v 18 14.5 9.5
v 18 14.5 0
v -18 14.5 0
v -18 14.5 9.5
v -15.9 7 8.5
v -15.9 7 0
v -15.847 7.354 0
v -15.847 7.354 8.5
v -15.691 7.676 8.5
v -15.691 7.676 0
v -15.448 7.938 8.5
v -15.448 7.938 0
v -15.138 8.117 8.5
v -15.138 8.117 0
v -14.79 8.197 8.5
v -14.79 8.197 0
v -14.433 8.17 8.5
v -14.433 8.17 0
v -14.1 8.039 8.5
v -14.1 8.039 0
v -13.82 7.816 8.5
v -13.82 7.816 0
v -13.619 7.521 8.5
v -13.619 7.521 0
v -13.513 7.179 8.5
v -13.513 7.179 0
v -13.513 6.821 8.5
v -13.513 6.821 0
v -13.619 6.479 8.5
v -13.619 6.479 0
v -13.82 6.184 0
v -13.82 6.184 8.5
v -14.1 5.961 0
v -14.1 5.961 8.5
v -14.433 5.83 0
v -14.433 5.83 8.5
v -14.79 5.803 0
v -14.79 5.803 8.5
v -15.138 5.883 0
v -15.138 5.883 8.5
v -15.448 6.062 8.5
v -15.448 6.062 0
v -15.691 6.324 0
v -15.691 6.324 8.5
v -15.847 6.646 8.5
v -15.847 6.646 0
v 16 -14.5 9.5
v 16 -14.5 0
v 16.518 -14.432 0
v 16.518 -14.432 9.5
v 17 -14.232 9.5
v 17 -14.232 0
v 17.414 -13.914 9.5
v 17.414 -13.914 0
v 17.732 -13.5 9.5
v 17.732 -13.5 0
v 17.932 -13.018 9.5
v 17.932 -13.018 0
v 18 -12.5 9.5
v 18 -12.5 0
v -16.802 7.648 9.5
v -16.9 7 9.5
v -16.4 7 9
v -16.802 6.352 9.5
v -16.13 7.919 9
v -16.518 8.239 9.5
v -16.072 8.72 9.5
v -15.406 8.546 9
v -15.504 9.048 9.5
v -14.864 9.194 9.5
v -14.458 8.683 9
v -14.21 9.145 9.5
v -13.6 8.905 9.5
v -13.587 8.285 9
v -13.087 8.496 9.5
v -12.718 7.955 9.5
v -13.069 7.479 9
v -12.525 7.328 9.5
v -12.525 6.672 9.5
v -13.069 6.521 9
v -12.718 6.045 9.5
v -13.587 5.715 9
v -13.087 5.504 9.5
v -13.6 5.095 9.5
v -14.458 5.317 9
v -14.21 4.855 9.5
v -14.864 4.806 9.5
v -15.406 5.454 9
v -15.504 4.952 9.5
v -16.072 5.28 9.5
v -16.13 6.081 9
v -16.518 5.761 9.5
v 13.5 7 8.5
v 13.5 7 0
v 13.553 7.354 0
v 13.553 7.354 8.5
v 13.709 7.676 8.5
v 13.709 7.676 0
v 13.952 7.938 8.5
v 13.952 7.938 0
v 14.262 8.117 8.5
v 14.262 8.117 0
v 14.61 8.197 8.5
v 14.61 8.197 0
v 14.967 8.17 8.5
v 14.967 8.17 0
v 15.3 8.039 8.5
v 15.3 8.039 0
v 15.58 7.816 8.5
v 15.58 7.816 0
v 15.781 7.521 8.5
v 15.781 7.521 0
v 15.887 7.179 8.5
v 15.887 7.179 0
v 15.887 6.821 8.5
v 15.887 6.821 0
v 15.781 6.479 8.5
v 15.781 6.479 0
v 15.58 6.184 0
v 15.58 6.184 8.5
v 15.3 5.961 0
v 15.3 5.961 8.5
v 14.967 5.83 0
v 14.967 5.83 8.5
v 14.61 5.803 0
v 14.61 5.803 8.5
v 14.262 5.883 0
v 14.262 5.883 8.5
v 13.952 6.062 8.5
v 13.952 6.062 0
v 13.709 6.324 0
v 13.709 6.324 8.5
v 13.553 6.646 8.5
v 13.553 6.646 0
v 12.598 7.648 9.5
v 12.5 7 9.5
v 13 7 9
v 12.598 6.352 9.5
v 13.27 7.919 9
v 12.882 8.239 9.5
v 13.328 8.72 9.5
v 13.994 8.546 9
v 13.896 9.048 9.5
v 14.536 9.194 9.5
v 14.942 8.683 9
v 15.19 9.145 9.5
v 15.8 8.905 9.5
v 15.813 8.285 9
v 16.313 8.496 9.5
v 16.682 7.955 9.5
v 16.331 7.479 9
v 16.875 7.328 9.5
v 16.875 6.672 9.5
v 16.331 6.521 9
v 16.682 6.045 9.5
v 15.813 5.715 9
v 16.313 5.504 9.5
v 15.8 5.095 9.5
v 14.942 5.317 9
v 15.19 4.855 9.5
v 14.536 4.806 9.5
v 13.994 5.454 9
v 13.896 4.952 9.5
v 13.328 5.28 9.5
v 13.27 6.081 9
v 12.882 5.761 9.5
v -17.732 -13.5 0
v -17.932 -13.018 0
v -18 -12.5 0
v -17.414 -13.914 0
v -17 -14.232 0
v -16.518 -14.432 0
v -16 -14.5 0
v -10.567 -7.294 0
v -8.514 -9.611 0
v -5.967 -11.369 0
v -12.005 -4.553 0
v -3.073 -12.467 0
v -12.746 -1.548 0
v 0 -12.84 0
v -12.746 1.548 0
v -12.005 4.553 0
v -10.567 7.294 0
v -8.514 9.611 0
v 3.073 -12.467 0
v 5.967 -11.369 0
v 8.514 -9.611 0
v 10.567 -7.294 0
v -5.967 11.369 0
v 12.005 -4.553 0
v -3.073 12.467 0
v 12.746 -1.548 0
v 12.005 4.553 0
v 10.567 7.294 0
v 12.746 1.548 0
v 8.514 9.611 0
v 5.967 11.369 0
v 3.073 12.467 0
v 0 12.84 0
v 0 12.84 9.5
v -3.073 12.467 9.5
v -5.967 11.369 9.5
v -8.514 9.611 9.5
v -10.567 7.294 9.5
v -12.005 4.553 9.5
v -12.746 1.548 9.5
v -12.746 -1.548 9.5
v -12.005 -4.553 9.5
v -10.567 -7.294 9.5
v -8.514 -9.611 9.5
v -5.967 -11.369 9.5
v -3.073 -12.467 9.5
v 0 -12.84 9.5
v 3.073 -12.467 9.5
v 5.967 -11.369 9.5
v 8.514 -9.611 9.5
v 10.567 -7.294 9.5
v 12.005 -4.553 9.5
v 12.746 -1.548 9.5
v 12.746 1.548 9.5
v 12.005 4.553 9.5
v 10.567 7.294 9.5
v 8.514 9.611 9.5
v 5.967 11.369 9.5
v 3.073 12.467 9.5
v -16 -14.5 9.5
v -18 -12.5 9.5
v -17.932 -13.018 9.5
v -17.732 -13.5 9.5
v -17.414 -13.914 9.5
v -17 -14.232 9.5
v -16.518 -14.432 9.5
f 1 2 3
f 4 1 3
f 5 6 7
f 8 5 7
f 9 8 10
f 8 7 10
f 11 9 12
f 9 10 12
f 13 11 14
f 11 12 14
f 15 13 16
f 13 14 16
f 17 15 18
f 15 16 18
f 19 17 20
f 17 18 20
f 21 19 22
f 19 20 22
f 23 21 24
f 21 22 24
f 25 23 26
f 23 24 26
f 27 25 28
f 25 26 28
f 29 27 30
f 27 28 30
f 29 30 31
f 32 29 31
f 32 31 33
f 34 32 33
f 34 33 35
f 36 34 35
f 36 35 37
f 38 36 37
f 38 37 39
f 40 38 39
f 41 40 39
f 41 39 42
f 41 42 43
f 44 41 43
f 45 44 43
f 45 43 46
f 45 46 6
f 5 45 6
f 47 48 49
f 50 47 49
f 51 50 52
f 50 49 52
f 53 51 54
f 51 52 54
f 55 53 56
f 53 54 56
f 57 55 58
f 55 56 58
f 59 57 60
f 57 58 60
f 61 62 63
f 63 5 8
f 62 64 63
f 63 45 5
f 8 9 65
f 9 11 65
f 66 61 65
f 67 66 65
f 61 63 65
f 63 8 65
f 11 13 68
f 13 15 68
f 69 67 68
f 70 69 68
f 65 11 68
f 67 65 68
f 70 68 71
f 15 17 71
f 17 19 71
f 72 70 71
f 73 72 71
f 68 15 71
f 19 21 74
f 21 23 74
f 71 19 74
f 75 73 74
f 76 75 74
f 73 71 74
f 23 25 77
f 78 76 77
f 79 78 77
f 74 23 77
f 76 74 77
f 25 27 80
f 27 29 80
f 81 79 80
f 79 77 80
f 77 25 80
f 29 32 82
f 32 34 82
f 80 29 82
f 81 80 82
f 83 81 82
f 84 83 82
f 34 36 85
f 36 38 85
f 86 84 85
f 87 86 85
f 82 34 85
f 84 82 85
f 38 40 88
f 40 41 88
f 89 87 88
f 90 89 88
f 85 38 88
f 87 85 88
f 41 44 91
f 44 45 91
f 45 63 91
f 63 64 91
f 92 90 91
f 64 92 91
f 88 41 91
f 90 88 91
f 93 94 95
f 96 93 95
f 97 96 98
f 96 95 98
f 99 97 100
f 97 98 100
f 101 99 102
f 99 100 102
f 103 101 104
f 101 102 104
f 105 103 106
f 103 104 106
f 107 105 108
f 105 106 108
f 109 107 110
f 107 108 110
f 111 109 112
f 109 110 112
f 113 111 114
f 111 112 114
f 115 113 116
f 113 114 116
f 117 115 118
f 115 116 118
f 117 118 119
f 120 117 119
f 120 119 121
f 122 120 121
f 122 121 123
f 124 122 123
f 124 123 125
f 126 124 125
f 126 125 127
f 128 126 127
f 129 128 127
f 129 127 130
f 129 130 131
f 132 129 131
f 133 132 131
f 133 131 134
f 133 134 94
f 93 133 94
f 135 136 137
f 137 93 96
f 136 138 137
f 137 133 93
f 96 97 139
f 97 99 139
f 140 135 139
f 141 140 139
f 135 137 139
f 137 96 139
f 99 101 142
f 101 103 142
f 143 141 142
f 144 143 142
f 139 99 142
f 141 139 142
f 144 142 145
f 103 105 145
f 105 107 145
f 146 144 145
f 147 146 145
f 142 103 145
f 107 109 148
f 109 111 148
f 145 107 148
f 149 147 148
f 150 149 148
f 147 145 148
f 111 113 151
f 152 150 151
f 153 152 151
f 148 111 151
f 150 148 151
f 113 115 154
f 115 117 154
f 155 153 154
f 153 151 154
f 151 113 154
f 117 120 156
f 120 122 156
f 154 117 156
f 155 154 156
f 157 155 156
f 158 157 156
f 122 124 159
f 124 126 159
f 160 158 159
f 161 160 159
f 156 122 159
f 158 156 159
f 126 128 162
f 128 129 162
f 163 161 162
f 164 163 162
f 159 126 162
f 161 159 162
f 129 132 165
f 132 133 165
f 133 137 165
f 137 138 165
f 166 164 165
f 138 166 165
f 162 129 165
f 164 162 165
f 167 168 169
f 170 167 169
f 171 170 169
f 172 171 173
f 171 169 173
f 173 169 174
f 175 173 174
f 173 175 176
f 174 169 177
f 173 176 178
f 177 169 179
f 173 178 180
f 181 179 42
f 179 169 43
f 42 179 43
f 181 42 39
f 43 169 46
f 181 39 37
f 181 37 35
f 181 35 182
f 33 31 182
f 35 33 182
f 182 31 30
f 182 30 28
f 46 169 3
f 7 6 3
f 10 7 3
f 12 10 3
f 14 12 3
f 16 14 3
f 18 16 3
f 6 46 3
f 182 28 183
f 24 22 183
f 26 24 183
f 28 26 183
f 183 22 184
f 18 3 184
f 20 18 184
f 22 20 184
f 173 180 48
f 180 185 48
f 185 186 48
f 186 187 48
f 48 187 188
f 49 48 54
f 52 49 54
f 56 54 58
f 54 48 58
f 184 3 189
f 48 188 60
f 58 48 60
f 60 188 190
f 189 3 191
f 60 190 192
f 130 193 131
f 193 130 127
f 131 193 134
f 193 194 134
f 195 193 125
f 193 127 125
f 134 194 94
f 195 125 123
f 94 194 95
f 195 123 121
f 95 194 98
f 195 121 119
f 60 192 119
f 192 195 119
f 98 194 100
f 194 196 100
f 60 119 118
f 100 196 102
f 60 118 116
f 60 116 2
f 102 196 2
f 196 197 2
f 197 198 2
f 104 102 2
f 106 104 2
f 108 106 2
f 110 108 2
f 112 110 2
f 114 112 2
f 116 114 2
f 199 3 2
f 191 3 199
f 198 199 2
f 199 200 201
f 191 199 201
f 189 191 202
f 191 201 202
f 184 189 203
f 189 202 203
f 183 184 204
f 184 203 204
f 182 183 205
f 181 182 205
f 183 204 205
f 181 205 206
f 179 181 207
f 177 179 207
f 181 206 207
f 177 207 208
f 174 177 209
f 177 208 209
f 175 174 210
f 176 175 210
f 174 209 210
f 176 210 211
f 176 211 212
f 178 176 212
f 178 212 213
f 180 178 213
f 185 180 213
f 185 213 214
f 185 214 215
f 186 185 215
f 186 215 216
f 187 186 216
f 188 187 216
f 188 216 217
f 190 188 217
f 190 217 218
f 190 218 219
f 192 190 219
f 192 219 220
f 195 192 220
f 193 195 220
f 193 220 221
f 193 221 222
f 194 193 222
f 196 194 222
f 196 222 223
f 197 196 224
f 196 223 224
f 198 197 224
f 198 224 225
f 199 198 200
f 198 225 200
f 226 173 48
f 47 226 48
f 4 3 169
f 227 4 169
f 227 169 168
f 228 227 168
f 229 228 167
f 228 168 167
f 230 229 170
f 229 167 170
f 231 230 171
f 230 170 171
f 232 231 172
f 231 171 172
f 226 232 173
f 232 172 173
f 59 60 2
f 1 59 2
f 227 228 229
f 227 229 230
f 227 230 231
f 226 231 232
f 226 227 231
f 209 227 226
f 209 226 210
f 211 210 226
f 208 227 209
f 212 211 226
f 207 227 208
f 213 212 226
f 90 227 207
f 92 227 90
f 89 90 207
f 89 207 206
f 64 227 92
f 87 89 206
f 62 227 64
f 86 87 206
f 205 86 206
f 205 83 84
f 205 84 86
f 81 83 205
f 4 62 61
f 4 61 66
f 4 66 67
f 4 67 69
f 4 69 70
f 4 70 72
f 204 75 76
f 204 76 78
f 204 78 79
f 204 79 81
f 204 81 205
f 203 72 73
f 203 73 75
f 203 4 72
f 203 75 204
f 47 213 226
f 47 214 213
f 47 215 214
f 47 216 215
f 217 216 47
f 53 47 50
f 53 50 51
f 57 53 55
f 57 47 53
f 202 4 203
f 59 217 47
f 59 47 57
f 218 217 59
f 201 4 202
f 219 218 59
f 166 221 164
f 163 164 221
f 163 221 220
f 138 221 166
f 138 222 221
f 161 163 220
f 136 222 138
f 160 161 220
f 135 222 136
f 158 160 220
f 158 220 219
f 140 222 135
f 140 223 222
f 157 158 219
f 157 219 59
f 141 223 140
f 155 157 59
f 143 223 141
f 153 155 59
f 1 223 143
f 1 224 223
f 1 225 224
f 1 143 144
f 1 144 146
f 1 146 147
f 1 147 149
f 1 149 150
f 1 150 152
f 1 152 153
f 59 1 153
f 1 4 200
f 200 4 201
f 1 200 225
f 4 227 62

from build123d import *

# Parameters (mm, degrees)
BOSS_EXTRUDE1_DEPTH                                 = 9.5
CUT_EXTRUDE1_REACH                                  = 11.5
SKETCH2_R                                           = 12.8397
CSK_FOR_M2_COUNTERSUNK_FLAT_HEAD_SCREW1_D           = 2.4
CSK_FOR_M2_COUNTERSUNK_FLAT_HEAD_SCREW1_DEPTH       = 9.5
CSK_FOR_M2_COUNTERSUNK_FLAT_HEAD_SCREW1_CSINK_D     = 4.4
CSK_FOR_M2_COUNTERSUNK_FLAT_HEAD_SCREW1_CSINK_ANGLE = 90


with BuildPart() as part:
    # Sketch1 → Boss-Extrude1 (new body)
    with BuildSketch(Plane.XY):
        with BuildLine():
            Line((-16, -14.5), (16, -14.5))
            ThreePointArc((16, -14.5), (17.414213562, -13.914213562), (18, -12.5))
            Line((18, -12.5), (18, 14.5))
            Line((18, 14.5), (-18, 14.5))
            Line((-18, 14.5), (-18, -12.5))
            ThreePointArc((-18, -12.5), (-17.414213562, -13.914213562), (-16, -14.5))
        make_face()
    extrude(amount=BOSS_EXTRUDE1_DEPTH)

    # Sketch2 → Cut-Extrude1 (cut, up to next)
    with BuildSketch(Plane(origin=(0, 0, 9.5), x_dir=(0, 1, 0), z_dir=(0, 0, 1)), mode=Mode.PRIVATE) as cut_extrude1_sk1:
        Circle(SKETCH2_R)
    cut_extrude1_tool1 = extrude(cut_extrude1_sk1.sketch, amount=-CUT_EXTRUDE1_REACH, mode=Mode.PRIVATE) & part.part
    add(cut_extrude1_tool1.solids().sort_by_distance((0, 0, 9.5))[0], mode=Mode.SUBTRACT)

    # CSK for M2 Countersunk Flat Head Screw1
    with Locations(Plane.XY.offset(9.5)):
        with Locations((-14.7, 7), (14.7, 7)):
            CounterSinkHole(CSK_FOR_M2_COUNTERSUNK_FLAT_HEAD_SCREW1_D / 2, CSK_FOR_M2_COUNTERSUNK_FLAT_HEAD_SCREW1_CSINK_D / 2, depth=CSK_FOR_M2_COUNTERSUNK_FLAT_HEAD_SCREW1_DEPTH, counter_sink_angle=CSK_FOR_M2_COUNTERSUNK_FLAT_HEAD_SCREW1_CSINK_ANGLE)


solid = part.part
